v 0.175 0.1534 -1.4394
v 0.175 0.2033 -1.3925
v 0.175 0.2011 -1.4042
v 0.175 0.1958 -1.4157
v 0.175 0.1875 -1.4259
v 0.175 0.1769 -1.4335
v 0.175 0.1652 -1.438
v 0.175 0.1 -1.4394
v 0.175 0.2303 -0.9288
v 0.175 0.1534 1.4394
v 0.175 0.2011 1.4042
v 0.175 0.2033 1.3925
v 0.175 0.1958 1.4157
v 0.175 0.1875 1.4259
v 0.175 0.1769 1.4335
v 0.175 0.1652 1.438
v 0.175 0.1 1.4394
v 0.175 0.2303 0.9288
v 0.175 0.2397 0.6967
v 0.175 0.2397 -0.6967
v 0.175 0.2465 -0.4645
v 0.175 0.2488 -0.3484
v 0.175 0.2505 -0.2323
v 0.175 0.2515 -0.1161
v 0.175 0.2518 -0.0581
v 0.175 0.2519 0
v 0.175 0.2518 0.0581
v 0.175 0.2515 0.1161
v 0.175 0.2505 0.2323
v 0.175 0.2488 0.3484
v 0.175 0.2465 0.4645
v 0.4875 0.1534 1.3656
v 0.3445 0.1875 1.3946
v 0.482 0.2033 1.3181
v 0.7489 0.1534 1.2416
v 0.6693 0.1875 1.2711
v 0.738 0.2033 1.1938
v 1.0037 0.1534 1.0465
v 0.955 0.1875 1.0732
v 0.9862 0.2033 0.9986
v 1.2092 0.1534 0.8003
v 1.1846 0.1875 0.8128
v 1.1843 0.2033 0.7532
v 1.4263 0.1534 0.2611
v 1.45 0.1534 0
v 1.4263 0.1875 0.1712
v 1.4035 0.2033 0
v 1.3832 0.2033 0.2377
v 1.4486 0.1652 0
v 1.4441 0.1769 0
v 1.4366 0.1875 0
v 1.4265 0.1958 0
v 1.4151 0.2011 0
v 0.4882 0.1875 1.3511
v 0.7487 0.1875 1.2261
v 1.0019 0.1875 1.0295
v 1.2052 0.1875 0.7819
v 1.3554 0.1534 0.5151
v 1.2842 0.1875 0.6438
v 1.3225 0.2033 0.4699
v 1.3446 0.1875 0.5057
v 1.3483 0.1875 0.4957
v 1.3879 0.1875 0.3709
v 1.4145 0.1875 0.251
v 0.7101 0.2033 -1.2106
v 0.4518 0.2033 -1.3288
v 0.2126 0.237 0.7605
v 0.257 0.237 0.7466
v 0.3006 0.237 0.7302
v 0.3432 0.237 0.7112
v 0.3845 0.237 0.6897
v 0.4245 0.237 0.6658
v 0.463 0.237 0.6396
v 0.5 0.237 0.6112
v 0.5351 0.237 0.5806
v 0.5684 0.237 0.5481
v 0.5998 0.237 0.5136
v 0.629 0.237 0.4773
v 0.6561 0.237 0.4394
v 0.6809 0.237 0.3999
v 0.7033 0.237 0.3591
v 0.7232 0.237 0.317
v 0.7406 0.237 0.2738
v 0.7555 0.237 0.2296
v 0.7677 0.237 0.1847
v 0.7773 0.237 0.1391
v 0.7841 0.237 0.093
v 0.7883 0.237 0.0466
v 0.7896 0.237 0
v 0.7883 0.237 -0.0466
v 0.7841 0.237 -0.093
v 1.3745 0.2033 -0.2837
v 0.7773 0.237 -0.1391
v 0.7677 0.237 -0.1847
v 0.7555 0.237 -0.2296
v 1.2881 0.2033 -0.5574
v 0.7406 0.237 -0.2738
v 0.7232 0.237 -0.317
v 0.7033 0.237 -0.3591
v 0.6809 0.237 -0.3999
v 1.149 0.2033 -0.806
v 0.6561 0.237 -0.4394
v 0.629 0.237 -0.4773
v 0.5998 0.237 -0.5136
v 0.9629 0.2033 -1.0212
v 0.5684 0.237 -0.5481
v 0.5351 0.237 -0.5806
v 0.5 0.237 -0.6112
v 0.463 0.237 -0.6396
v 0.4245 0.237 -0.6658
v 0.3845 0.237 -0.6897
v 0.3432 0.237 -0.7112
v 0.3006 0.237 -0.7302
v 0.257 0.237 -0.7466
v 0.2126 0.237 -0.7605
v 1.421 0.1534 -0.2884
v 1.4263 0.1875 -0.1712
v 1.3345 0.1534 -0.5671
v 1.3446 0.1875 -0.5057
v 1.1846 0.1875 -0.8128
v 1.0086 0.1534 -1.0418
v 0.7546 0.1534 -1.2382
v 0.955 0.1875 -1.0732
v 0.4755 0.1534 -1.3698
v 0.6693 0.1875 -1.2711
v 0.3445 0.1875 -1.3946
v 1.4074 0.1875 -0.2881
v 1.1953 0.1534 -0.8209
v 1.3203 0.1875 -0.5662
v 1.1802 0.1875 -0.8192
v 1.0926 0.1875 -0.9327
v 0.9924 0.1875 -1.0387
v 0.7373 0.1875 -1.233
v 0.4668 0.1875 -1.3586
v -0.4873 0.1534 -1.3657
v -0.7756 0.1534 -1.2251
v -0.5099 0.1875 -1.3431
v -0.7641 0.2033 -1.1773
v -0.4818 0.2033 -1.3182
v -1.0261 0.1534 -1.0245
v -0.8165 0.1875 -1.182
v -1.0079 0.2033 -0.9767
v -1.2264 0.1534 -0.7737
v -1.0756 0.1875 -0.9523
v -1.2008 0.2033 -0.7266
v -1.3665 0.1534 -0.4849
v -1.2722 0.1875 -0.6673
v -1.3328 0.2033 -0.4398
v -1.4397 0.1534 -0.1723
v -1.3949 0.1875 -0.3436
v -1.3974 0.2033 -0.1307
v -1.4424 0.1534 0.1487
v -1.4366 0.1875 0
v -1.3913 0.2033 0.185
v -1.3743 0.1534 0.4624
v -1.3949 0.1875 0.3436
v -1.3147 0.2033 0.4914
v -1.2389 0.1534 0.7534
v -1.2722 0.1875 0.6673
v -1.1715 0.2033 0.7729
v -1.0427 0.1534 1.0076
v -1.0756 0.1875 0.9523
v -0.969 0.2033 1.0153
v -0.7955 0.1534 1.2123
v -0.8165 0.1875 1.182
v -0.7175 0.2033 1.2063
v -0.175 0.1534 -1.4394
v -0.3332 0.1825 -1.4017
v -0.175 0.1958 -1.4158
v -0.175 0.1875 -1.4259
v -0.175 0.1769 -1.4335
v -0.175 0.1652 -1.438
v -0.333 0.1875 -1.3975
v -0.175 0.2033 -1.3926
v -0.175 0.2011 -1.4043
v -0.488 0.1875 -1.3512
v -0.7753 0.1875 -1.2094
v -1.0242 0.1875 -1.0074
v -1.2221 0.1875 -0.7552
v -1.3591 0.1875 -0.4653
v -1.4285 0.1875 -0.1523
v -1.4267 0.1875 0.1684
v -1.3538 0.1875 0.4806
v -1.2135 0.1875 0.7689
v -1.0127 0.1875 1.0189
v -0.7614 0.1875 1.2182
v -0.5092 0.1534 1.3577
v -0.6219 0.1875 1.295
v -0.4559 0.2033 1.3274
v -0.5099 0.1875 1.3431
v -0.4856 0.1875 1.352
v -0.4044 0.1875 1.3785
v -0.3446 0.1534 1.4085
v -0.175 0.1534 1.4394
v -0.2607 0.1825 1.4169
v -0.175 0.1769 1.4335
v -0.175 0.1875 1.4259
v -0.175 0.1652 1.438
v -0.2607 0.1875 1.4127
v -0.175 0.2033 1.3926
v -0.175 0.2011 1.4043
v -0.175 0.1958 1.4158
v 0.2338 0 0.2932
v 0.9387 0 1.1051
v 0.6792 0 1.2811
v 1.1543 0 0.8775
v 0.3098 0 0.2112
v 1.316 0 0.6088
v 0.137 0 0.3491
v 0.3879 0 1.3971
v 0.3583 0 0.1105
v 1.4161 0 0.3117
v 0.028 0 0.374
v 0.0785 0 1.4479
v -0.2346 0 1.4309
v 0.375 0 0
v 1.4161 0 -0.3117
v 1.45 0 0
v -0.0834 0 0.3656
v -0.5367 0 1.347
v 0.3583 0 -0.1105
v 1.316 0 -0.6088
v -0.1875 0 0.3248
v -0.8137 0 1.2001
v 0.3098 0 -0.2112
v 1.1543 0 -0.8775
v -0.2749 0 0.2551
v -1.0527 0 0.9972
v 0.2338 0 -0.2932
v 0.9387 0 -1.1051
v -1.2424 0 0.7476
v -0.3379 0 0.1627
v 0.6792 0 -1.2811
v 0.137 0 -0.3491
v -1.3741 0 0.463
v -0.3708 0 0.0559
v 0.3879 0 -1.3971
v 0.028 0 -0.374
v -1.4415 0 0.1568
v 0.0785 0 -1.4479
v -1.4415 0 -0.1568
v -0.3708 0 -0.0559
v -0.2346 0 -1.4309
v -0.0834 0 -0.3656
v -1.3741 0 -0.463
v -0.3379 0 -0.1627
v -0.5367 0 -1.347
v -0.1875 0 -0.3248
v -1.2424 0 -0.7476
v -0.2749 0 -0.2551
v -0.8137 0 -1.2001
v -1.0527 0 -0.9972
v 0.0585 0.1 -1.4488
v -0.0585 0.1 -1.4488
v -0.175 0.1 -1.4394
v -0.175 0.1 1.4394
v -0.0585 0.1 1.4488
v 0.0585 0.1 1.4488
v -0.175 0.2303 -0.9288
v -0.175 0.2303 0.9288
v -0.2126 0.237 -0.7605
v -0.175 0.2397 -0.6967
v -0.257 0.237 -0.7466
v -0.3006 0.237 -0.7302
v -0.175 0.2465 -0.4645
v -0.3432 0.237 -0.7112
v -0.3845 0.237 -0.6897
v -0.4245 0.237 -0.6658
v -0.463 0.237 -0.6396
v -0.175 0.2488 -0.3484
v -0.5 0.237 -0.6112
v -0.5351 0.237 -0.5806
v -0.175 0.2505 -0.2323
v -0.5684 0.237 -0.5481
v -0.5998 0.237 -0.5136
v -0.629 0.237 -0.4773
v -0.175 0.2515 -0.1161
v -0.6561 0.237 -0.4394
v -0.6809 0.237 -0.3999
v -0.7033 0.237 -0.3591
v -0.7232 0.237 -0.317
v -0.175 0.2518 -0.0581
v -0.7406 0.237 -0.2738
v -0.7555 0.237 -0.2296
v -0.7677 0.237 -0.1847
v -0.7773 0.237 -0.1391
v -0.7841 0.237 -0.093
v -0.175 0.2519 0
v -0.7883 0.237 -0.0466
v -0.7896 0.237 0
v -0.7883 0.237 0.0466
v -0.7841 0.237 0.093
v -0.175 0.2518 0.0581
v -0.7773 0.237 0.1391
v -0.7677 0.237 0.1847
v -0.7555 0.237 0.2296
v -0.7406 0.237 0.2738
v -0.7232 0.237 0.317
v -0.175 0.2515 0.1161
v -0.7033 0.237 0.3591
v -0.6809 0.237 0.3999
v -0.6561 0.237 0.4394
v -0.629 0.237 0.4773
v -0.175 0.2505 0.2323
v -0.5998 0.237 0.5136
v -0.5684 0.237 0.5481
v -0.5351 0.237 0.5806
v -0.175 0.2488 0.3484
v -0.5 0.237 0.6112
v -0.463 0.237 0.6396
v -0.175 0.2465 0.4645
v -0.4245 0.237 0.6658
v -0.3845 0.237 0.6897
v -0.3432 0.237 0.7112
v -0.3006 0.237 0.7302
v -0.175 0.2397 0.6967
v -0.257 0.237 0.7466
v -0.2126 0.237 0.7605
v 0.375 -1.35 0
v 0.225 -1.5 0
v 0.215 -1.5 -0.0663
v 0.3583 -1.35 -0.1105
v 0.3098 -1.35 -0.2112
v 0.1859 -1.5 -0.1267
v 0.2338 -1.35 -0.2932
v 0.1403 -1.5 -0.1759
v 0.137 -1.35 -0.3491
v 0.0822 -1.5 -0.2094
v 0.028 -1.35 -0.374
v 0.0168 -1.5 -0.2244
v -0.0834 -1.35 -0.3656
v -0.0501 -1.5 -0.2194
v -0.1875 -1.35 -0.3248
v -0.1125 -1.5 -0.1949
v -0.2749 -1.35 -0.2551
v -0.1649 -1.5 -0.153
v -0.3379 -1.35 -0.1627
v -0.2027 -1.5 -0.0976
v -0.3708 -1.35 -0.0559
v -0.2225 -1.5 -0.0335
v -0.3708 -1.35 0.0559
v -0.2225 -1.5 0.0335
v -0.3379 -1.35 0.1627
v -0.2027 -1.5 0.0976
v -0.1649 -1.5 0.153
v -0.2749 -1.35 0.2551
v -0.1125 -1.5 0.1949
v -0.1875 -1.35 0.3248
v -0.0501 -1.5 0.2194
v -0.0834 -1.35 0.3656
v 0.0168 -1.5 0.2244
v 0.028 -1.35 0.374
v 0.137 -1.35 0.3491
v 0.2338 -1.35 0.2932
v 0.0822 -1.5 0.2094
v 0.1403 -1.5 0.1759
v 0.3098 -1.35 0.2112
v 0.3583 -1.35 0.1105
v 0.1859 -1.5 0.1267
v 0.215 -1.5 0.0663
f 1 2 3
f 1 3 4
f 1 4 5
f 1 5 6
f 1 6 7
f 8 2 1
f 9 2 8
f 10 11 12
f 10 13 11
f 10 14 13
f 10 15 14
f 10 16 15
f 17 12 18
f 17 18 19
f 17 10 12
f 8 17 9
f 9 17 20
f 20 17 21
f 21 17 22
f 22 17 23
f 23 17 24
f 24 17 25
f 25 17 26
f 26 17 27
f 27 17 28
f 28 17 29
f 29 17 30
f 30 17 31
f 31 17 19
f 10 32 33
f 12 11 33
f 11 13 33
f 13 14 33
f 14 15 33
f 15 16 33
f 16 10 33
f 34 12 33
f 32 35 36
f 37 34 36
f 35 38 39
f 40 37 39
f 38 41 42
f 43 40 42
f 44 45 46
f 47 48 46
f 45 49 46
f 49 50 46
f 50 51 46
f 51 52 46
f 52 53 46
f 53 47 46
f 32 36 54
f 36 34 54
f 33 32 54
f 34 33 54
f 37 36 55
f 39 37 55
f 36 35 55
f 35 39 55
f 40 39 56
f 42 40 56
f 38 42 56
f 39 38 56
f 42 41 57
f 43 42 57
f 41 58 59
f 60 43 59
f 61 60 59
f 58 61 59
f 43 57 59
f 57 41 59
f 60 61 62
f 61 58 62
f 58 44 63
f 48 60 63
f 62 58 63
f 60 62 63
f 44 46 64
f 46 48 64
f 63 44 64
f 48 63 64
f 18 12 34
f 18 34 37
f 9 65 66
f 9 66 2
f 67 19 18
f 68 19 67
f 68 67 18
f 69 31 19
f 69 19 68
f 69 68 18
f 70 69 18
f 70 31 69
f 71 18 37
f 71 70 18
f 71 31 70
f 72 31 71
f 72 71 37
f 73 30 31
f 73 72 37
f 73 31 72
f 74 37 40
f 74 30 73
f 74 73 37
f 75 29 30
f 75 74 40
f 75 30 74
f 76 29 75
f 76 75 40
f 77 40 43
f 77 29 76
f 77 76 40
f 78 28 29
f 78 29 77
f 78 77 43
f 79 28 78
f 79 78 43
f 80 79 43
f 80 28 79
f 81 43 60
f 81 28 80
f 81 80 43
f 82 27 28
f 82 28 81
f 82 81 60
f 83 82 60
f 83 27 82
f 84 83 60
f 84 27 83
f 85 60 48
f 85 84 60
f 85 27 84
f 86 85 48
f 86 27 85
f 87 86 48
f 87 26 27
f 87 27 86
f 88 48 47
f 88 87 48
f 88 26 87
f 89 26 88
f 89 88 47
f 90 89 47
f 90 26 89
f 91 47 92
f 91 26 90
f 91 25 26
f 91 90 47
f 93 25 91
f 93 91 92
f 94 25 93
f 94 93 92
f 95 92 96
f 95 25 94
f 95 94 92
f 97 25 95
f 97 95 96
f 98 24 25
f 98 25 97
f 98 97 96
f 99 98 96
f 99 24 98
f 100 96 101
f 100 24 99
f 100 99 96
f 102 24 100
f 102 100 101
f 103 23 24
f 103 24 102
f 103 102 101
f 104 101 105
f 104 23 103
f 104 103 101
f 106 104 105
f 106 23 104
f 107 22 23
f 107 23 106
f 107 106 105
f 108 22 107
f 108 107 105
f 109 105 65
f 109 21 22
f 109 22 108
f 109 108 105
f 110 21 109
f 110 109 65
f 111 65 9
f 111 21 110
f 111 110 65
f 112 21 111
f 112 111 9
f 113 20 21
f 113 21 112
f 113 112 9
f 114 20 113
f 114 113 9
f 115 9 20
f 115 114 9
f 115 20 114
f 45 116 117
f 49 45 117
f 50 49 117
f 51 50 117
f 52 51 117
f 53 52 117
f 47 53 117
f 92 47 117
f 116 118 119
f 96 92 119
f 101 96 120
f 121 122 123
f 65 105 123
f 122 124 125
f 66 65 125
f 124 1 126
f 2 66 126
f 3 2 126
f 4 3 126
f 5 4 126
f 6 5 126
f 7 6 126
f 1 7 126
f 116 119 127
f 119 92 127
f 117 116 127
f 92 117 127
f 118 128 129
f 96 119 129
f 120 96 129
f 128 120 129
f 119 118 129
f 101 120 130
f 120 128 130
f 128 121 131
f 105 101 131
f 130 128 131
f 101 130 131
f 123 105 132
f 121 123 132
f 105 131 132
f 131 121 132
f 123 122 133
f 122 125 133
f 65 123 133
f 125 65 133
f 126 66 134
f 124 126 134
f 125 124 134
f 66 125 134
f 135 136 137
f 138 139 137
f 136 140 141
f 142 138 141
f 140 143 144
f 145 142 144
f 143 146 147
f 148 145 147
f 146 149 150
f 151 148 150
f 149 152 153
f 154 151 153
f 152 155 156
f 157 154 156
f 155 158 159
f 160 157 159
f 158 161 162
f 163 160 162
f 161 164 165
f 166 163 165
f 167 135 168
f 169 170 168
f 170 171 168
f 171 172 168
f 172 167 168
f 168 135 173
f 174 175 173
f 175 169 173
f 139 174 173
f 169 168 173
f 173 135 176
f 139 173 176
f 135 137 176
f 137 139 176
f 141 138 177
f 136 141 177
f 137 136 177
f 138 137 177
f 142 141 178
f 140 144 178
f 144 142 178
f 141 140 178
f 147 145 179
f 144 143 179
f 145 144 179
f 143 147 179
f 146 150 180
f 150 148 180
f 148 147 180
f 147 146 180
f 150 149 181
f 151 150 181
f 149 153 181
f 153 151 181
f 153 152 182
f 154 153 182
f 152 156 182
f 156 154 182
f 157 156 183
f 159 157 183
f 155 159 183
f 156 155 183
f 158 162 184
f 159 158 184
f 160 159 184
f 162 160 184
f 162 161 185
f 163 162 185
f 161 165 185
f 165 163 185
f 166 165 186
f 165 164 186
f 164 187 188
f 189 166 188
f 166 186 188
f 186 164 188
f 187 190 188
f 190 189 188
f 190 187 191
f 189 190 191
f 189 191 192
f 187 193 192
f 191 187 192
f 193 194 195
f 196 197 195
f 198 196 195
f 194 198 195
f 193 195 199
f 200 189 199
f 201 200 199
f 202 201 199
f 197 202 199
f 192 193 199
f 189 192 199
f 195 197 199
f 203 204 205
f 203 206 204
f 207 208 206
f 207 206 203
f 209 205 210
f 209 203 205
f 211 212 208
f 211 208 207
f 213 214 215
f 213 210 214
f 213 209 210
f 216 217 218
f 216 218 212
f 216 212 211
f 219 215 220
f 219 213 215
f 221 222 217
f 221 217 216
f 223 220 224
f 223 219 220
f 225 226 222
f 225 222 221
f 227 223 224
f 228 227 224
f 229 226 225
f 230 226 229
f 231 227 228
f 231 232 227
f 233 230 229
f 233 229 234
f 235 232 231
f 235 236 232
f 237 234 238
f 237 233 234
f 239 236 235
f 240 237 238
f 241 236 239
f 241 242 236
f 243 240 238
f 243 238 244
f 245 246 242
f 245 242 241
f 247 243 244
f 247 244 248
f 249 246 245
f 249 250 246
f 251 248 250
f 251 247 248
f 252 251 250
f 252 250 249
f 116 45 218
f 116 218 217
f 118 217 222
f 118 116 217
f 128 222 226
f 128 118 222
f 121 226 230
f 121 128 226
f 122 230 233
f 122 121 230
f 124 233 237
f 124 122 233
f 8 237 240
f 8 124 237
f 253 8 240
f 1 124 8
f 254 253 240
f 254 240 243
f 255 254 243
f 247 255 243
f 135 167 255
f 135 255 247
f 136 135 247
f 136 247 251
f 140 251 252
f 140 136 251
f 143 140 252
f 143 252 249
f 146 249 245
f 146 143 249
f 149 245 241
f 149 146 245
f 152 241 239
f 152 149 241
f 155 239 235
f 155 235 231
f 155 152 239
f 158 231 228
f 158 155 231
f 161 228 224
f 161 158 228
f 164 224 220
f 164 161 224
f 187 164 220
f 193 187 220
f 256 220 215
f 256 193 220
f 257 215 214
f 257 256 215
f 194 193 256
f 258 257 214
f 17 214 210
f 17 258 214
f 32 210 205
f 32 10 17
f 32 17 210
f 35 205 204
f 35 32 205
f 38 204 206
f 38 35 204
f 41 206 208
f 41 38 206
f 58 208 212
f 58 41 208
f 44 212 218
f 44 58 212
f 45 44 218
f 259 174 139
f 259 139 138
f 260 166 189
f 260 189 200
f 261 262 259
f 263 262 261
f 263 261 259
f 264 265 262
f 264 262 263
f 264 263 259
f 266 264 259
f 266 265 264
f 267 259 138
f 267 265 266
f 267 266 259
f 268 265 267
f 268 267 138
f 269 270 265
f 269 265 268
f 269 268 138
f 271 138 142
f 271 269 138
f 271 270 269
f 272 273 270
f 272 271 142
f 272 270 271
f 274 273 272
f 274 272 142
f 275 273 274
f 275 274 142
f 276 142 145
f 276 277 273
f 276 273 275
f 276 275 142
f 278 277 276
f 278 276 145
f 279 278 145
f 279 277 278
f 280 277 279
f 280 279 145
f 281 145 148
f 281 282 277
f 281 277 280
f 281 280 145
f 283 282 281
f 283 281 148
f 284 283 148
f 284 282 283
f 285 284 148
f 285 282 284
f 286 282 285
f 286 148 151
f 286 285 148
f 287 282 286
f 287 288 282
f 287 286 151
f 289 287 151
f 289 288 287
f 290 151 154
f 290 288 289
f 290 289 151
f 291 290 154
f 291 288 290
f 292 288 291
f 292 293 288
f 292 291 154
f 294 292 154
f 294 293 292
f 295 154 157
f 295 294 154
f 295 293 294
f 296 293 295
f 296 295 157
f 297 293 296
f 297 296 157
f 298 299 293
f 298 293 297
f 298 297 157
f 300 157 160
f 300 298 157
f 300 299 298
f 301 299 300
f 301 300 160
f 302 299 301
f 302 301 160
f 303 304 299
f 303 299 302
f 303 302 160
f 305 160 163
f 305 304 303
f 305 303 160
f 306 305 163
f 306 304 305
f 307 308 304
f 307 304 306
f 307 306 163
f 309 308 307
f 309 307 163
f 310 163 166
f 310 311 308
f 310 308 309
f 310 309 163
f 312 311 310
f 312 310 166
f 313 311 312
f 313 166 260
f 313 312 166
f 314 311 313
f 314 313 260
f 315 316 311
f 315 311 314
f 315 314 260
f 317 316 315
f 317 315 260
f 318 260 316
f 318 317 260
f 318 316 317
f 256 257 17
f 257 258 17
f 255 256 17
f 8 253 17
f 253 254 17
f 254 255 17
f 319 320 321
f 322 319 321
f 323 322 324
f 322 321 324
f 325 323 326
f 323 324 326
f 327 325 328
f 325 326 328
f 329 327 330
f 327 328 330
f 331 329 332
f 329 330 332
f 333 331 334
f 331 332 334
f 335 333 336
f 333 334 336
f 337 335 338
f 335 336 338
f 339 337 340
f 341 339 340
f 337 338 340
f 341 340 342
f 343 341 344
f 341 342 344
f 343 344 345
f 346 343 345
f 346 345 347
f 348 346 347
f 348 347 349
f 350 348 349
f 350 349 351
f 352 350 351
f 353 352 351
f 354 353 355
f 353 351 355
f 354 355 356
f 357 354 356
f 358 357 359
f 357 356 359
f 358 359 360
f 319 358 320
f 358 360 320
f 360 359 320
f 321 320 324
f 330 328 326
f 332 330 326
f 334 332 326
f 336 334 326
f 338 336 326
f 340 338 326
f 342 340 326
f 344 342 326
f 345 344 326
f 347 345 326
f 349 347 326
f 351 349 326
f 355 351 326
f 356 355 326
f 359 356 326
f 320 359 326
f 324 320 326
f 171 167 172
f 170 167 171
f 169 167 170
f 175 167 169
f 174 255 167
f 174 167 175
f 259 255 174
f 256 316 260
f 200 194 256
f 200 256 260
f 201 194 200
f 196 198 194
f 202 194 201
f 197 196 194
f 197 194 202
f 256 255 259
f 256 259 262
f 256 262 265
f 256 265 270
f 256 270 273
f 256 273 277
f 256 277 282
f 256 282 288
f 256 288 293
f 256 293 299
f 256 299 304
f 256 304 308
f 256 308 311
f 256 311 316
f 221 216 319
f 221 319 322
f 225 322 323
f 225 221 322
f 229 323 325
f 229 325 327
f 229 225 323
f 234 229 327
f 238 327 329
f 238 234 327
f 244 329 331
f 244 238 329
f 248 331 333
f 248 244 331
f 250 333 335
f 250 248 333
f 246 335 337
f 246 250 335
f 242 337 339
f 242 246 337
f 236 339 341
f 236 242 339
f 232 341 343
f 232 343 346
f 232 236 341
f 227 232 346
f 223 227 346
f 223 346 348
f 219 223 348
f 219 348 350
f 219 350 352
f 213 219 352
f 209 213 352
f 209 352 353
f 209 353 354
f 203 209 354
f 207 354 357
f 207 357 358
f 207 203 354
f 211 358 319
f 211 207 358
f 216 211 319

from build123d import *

# Parameters (mm, degrees)
SKETCH2_R               = 0.375
BOSS_EXTRUDE2_DEPTH     = 1.5
FILLET1_R               = 0.05
CHAMFER2_SIZE           = 0.15
CUT_EXTRUDE1_DEPTH      = 2.4500001
CUT_EXTRUDE1_DEPTH_BACK = 2.4500001


with BuildPart() as part:
    # Sketch4 → Revolve1 (revolve)
    with BuildSketch(Plane.XY):
        with BuildLine():
            Line((0, 0), (1.45, 0))
            Line((1.45, 0), (1.45, 0.2))
            ThreePointArc((1.45, 0.2), (0.725477446, 0.239469483), (0, 0.252631753))
            Line((0, 0.252631753), (0, 0))
        make_face()
    revolve(axis=Axis((0, -848.356227188, 0), (0, 1, 0)))

    # Sketch2 → Boss-Extrude2 (add)
    with BuildSketch(Plane(origin=(0, 0, 0), x_dir=(1, 0, 0), z_dir=(0, 1, 0))):
        Circle(SKETCH2_R)
    extrude(amount=-BOSS_EXTRUDE2_DEPTH)

    # Fillet1
    fillet1_edges = [part.edges().sort_by_distance(p)[0] for p in [
        (-1.45, 0.2, 0),
    ]]
    fillet(fillet1_edges, radius=FILLET1_R)

    # Chamfer2
    chamfer2_edges = [part.edges().sort_by_distance(p)[0] for p in [
        (-0.375, -1.5, 0),
    ]]
    chamfer(chamfer2_edges, length=CHAMFER2_SIZE)

    # Sketch3 → Cut-Extrude1 (cut, two sides)
    with BuildSketch(Plane.XY) as cut_extrude1_sk:
        Polygon((-0.175, 0.35), (0, 0.35), (0.175, 0.35), (0.175, 0.1), (0, 0.1), (-0.175, 0.1), align=None)
    extrude(amount=CUT_EXTRUDE1_DEPTH, mode=Mode.SUBTRACT)
    extrude(cut_extrude1_sk.sketch, amount=-CUT_EXTRUDE1_DEPTH_BACK, mode=Mode.SUBTRACT)


solid = part.part
